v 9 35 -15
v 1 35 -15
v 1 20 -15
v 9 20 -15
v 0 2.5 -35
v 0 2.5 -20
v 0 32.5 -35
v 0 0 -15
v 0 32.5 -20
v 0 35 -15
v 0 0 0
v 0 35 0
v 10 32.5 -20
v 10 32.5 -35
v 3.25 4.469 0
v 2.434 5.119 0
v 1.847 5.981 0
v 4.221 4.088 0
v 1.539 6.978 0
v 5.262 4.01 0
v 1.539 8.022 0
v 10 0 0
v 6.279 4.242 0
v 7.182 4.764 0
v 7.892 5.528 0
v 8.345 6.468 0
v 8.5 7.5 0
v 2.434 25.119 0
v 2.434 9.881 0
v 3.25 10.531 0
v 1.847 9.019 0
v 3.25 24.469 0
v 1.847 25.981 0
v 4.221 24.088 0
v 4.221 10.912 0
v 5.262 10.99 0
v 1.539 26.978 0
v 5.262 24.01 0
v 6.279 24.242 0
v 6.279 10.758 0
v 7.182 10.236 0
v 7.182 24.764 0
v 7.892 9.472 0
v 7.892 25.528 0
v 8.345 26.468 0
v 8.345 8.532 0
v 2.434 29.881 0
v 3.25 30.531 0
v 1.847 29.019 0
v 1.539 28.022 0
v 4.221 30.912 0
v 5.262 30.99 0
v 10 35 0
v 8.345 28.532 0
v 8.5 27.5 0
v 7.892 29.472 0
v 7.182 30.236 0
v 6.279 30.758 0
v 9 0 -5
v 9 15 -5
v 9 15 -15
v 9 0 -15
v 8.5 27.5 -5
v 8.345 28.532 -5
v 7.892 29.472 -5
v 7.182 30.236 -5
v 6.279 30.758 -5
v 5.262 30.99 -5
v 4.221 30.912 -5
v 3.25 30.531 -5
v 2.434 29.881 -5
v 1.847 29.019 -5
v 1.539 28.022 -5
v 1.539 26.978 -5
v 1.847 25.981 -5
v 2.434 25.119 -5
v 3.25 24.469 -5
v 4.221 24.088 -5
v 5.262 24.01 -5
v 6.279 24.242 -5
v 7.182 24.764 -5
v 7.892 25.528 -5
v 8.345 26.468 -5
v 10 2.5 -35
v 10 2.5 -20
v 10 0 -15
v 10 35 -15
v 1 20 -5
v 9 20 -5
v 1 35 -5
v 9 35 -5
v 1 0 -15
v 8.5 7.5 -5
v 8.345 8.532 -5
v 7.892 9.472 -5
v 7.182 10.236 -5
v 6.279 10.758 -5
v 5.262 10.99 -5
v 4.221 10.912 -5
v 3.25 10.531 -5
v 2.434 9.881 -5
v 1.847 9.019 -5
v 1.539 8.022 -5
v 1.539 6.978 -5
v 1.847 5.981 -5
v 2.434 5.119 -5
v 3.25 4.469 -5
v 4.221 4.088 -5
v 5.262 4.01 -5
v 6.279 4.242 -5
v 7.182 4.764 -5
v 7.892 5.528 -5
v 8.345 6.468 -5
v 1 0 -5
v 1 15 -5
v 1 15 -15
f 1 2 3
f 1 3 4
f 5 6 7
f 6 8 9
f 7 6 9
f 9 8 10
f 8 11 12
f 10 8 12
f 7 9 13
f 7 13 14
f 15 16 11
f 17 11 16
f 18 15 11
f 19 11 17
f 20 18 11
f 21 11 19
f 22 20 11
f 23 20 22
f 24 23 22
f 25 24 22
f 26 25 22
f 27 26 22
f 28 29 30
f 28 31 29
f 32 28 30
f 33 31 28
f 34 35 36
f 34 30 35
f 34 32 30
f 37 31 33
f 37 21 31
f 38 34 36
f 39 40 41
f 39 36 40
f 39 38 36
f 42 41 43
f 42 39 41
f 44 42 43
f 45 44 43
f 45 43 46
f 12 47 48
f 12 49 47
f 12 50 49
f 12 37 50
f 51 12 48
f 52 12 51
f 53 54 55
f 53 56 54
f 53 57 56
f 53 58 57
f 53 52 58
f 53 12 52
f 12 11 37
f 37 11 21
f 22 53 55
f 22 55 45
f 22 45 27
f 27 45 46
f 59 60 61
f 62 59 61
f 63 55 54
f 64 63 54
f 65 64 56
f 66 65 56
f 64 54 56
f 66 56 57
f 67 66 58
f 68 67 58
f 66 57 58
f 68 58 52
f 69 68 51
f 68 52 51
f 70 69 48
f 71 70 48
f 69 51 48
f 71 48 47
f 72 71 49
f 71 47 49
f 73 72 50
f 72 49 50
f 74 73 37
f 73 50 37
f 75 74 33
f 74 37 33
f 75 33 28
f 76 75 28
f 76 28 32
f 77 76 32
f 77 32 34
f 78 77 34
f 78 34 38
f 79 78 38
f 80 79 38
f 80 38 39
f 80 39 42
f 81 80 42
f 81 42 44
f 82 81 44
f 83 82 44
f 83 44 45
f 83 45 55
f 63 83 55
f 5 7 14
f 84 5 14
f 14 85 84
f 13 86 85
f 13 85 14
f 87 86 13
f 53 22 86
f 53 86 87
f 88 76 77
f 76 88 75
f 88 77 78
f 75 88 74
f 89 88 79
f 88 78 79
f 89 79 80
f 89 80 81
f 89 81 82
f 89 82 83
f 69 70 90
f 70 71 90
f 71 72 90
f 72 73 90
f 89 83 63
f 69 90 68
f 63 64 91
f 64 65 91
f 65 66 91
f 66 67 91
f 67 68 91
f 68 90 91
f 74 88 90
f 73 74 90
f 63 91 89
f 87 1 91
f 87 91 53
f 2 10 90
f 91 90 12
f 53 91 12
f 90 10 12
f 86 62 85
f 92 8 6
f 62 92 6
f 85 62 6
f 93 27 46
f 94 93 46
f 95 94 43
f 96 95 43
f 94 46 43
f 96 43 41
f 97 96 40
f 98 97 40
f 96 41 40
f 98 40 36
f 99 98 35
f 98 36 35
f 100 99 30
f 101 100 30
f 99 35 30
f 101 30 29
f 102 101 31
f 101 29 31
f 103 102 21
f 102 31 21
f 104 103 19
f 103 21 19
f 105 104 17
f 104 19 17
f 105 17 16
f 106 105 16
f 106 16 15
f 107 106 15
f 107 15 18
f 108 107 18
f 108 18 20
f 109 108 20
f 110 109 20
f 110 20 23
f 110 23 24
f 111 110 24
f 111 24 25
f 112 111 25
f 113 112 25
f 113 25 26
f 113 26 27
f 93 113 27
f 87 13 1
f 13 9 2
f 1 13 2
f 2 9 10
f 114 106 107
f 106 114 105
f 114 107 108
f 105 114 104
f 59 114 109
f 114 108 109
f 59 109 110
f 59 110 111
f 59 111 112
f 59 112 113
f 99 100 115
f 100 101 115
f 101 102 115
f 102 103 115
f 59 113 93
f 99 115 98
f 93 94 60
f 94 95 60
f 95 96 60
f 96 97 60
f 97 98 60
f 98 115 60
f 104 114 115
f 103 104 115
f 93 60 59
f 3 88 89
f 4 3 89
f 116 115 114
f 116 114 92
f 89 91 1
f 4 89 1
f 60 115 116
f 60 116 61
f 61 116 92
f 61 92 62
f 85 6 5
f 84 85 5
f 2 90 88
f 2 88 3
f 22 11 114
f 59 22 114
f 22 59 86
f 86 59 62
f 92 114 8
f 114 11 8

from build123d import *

# Parameters (mm, degrees)
SKETCH1_W           = 15
SKETCH1_H           = 30
BOSS_EXTRUDE1_DEPTH = 10
SKETCH2_R           = 3.5
CUT_EXTRUDE1_DEPTH  = 15
SKETCH3_W           = 8
SKETCH3_H           = 10
CUT_EXTRUDE2_DEPTH  = 35
SKETCH4_W           = 10
SKETCH4_H           = 5
BOSS_EXTRUDE2_DEPTH = 35


with BuildPart() as part:
    # Sketch1 → Boss-Extrude1 (new body)
    with BuildSketch(Plane(origin=(0, 0, 0), x_dir=(0, 0, -1), z_dir=(1, 0, 0))):
        with Locations((27.5, 17.5)):
            Rectangle(SKETCH1_W, SKETCH1_H)
        Polygon((20, 2.5), (20, 32.5), (15, 35), (0, 35), (0, 0), (15, 0), align=None)
    extrude(amount=BOSS_EXTRUDE1_DEPTH)

    # Sketch2 → Cut-Extrude1 (cut)
    with BuildSketch(Plane.XY):
        with Locations((5, 27.5)):
            Circle(SKETCH2_R)
        with Locations((5, 7.5)):
            Circle(SKETCH2_R)
    extrude(amount=-CUT_EXTRUDE1_DEPTH, mode=Mode.SUBTRACT)

    # Sketch3 → Cut-Extrude2 (cut)
    with BuildSketch(Plane(origin=(0, 35, 0), x_dir=(1, 0, 0), z_dir=(0, 1, 0))):
        with Locations((5, 10)):
            Rectangle(SKETCH3_W, SKETCH3_H)
    extrude(amount=-CUT_EXTRUDE2_DEPTH, mode=Mode.SUBTRACT)

    # Sketch4 → Boss-Extrude2 (add)
    with BuildSketch(Plane.XY):
        with Locations((5, 17.5)):
            Rectangle(SKETCH4_W, SKETCH4_H)
    extrude(amount=-BOSS_EXTRUDE2_DEPTH)


solid = part.part
